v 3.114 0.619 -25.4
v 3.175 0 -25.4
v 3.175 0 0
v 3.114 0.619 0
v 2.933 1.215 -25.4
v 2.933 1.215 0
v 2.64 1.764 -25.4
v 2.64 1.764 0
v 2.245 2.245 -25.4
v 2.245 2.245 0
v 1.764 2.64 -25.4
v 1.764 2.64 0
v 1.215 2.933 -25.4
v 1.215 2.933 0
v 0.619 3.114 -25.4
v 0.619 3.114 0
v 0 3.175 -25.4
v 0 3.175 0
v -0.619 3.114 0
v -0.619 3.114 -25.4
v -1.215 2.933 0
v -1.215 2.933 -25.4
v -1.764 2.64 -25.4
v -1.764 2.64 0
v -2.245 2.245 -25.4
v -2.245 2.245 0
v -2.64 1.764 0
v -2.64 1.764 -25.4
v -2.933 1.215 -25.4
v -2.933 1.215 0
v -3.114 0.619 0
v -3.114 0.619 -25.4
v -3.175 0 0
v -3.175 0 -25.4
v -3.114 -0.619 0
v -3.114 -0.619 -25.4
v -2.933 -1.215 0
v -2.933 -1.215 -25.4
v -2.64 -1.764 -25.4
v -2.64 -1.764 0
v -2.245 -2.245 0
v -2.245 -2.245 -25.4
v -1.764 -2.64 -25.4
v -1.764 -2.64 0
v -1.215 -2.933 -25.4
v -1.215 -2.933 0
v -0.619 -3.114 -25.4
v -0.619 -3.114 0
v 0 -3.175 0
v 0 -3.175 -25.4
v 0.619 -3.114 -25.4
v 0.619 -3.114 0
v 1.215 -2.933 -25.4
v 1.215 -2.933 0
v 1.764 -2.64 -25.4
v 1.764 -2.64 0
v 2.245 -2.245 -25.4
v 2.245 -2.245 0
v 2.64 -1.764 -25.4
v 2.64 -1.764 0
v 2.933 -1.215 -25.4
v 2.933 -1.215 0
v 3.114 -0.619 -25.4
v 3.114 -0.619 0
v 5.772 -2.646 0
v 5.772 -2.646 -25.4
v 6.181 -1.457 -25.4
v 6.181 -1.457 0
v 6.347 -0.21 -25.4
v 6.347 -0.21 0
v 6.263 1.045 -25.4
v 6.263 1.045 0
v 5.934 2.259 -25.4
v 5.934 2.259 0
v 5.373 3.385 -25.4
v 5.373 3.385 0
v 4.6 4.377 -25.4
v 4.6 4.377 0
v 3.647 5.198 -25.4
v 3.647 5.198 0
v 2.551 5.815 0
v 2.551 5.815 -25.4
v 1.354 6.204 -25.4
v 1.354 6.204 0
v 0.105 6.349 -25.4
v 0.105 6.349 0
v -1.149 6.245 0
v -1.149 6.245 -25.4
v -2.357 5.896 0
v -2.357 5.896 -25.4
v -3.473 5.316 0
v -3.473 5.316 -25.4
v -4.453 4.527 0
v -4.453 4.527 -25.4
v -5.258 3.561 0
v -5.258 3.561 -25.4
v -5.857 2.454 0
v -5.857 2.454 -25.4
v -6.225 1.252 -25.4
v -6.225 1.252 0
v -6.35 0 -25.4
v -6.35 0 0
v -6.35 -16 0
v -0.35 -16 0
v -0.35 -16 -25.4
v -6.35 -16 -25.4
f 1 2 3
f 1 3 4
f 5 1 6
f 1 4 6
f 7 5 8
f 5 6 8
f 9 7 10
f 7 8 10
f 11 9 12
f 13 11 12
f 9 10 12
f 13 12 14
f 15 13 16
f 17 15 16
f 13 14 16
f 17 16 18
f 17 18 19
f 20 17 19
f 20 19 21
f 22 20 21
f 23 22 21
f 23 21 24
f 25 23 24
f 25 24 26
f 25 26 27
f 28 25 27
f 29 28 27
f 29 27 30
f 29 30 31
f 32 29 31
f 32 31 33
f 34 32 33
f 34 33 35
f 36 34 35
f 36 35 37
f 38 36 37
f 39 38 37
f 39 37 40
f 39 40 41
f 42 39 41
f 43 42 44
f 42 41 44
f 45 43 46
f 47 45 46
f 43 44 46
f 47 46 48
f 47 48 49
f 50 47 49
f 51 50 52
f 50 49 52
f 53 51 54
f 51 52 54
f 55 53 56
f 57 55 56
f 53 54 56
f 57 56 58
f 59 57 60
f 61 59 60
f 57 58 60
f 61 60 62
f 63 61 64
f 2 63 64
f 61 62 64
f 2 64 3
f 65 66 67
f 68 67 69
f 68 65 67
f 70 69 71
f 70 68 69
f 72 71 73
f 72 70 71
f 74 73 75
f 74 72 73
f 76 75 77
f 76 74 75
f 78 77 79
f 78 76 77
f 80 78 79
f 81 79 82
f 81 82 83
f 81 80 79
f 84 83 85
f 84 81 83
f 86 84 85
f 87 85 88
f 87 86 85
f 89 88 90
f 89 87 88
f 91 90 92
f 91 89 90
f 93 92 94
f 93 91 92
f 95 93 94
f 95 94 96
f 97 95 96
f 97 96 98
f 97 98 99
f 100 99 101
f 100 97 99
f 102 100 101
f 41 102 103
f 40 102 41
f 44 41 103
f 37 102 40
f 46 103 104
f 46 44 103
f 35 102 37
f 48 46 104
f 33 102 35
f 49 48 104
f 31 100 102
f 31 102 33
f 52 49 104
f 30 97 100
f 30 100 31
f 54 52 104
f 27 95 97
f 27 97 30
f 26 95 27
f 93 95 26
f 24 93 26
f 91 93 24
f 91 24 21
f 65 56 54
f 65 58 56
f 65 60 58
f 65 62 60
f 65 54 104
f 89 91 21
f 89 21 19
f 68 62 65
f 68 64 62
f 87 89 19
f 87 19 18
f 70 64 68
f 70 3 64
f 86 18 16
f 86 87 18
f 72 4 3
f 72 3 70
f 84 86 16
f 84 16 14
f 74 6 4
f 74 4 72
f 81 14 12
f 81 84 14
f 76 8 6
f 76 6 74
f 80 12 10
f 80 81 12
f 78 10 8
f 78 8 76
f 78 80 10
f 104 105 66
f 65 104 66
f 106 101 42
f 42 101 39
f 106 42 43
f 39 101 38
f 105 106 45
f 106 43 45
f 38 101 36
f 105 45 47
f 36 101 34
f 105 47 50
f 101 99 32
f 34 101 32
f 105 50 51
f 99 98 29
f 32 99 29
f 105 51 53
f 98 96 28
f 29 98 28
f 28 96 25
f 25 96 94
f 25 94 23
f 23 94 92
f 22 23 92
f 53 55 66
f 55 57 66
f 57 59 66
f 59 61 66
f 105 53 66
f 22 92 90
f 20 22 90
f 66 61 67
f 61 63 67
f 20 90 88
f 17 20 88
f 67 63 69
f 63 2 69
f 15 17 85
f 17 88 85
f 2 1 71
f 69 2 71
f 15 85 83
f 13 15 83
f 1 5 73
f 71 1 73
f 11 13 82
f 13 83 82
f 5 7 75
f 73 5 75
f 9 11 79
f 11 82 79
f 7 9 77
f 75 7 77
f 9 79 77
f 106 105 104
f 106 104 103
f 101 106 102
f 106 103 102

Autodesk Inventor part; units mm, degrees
ref_plane "YZ Plane" through (0, 0, 0) normal (1, 0, 0) x (0, 1, 0)
ref_plane "XZ Plane" through (0, 0, 0) normal (0, 1, 0) x (-1, 0, 0)
ref_plane "XY Plane" through (0, 0, 0) normal (0, 0, 1) x (1, 0, 0)
sketch "Sketch1" plane through (0, 0, 0) normal (0, 0, 1) x (1, 0, 0)
  circle A0 centre (0, 0) radius 3.175
  circle A1 centre (0, 0) radius 6.35
  line L0 (-0.35, -16) -> (-6.35, -16)
  line L1 (-6.35, -16) -> (-6.35, 0)
  line L2 (-0.35, -16) -> (5.7723, -2.6464)
  dimension "d0" = 6.35
  dimension "d1" = 12.7
  dimension "d29" = 6
extrude "Extrusion1" add sketch "Sketch1" against normal blind 25.4
properties part number "Servo Mount"
